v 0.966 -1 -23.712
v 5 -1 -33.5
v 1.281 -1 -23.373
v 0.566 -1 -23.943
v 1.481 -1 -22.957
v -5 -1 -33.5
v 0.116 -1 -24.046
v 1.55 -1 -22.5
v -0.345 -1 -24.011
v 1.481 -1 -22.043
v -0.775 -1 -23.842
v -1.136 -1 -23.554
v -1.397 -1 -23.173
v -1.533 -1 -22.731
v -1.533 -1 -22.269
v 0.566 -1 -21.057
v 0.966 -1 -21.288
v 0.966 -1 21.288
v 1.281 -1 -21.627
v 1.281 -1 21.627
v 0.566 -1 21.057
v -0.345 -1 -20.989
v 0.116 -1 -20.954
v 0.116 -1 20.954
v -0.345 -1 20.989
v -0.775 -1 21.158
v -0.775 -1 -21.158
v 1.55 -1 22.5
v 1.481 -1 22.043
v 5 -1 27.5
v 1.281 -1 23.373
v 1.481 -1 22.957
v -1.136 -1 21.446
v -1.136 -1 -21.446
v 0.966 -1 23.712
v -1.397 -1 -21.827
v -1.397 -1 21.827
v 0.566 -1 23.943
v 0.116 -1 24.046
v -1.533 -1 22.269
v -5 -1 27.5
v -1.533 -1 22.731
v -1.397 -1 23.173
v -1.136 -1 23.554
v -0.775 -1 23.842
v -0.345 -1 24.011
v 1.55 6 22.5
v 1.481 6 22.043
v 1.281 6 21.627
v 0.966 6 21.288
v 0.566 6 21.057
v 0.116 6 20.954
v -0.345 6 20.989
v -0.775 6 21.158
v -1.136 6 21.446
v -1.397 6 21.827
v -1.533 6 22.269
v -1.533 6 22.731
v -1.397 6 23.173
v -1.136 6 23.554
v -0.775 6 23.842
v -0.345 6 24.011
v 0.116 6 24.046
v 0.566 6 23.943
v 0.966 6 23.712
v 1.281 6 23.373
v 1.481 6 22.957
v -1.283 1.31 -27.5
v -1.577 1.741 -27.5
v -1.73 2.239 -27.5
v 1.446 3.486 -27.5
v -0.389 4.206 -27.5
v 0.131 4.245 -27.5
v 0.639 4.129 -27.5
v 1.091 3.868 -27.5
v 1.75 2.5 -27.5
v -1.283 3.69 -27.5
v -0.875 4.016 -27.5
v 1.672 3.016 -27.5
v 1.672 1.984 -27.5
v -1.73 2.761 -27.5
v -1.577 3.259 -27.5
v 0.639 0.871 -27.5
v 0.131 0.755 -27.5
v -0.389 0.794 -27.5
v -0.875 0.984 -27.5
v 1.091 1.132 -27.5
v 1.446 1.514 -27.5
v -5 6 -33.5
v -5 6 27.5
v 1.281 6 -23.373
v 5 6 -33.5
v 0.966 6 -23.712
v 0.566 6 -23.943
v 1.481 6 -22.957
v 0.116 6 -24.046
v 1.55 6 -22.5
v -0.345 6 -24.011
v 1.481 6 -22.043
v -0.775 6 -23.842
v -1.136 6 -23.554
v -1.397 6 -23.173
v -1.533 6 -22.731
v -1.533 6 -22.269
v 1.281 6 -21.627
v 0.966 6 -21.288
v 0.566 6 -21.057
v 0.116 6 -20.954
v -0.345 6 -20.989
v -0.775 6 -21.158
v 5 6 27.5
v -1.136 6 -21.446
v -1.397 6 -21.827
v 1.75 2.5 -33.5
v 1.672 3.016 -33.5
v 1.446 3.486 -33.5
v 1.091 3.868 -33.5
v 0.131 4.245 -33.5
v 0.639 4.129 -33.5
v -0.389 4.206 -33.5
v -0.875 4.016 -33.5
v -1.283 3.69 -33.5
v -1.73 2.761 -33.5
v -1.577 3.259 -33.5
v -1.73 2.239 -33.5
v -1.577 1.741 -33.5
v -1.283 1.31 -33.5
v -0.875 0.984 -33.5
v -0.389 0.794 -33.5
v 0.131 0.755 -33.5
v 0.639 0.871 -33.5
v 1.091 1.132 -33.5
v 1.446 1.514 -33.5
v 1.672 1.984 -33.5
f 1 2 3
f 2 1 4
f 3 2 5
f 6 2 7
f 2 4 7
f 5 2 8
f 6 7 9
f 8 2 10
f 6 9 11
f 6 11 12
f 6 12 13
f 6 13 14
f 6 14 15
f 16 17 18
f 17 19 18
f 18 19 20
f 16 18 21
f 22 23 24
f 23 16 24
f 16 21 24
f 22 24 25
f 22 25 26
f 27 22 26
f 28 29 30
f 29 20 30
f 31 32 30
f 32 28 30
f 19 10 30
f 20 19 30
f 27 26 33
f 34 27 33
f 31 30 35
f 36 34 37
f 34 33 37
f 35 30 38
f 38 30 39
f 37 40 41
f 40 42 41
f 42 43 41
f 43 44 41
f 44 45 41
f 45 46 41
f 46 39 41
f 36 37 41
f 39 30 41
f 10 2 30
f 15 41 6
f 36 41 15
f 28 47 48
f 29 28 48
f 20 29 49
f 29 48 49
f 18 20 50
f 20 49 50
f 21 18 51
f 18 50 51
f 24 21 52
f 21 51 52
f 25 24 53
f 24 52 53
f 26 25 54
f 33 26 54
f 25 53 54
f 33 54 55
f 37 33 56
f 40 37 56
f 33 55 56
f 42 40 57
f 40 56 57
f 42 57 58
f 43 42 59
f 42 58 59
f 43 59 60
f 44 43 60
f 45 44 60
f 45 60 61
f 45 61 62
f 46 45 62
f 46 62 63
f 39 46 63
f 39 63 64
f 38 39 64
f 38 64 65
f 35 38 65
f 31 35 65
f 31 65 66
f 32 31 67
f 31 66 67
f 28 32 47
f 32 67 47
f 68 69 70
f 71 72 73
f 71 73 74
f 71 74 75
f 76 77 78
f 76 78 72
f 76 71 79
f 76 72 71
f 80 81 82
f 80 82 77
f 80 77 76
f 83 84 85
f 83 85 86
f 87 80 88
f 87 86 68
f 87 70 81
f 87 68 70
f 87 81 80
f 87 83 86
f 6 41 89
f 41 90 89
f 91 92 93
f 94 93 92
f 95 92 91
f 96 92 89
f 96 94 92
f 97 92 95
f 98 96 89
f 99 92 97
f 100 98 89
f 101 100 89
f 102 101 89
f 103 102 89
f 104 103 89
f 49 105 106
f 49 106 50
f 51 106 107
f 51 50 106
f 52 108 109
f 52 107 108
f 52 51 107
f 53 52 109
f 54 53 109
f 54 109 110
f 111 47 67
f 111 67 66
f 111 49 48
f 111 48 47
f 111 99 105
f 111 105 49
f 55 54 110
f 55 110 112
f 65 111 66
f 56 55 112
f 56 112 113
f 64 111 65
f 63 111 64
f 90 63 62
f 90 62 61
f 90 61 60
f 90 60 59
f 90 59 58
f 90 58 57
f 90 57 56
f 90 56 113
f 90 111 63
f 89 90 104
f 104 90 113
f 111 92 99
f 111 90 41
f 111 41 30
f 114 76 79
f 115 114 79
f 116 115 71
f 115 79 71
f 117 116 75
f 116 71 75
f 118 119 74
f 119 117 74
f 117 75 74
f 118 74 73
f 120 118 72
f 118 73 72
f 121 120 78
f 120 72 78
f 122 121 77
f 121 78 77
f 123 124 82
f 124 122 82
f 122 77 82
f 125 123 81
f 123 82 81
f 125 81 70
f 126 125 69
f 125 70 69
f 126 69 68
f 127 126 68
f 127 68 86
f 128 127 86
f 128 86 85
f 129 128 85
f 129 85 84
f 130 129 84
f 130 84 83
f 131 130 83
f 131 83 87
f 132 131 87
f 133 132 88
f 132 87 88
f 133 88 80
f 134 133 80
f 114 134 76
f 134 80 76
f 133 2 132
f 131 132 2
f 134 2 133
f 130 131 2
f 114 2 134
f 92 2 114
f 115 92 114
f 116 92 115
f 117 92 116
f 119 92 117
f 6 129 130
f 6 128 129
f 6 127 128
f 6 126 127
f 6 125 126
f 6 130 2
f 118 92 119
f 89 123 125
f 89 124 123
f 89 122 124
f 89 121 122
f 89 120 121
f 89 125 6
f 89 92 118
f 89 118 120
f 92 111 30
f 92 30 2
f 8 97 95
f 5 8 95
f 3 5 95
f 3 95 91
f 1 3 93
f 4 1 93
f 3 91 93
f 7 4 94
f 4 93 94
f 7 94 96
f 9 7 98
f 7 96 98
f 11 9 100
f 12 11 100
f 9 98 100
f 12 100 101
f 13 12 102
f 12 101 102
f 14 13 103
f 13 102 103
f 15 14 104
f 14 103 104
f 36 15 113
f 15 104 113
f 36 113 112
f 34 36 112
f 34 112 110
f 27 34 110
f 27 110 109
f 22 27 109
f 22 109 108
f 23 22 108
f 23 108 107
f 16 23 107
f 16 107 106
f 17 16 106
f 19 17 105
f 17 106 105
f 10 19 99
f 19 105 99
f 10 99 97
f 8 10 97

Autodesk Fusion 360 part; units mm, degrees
sketch "Sketch1" plane through (0, 0, 0) normal (0, 1, 0) x (1, 0, 0)
  line L0 (5, 27.5) -> (-5, 27.5)
  line L1 (-5, 27.5) -> (-5, -27.5)
  line L2 (-5, -27.5) -> (5, -27.5)
  line L3 (5, -27.5) -> (5, 27.5)
  line L4 (5, 27.5) -> (-5, -27.5) construction
  line L5 (-5, 27.5) -> (5, -27.5) construction
  line L6 (0, -24.05) -> (0, -22.5)
  circle A0 centre (0, -22.5) radius 1.55
  circle A1 centre (0, 22.5) radius 1.55
  dimension "d1" = 10
  dimension "d2" = 55
  dimension "d4" = 3.1
extrude "Extrude1" add sketch "Sketch1" along normal blind 5
sketch "Sketch2" plane through (0, 0, -27.5) normal (0, 0, -1) x (1, 0, 0)
  line L0 (5, 0) -> (-5, 0)
  line L1 (-5, 0) -> (-5, -5)
  line L2 (-5, -5) -> (5, -5)
  line L3 (5, -5) -> (5, 0)
  circle A0 centre (0, -2.5) radius 1.75
  dimension "d7" = 2.5
  dimension "d8" = 3.5
extrude "Extrude2" cut sketch "Sketch2" against normal blind 2 contours A0
extrude "Extrude3" add 1 faces at (3.9167, 2.5, -27.5) along direction (0, 0, -1) blind 6
extrude "Extrude4" add 1 faces at (-0.3896, 1.8511, -25.5) along direction (0, 0, -1) blind 2
extrude "Extrude5" add 1 faces at (-0.0386, 5, -30.3486) along direction (0, 1, 0) blind 1
extrude "Extrude6" add 1 faces at (-0.0386, 0, -30.3486) along direction (0, -1, 0) blind 1
